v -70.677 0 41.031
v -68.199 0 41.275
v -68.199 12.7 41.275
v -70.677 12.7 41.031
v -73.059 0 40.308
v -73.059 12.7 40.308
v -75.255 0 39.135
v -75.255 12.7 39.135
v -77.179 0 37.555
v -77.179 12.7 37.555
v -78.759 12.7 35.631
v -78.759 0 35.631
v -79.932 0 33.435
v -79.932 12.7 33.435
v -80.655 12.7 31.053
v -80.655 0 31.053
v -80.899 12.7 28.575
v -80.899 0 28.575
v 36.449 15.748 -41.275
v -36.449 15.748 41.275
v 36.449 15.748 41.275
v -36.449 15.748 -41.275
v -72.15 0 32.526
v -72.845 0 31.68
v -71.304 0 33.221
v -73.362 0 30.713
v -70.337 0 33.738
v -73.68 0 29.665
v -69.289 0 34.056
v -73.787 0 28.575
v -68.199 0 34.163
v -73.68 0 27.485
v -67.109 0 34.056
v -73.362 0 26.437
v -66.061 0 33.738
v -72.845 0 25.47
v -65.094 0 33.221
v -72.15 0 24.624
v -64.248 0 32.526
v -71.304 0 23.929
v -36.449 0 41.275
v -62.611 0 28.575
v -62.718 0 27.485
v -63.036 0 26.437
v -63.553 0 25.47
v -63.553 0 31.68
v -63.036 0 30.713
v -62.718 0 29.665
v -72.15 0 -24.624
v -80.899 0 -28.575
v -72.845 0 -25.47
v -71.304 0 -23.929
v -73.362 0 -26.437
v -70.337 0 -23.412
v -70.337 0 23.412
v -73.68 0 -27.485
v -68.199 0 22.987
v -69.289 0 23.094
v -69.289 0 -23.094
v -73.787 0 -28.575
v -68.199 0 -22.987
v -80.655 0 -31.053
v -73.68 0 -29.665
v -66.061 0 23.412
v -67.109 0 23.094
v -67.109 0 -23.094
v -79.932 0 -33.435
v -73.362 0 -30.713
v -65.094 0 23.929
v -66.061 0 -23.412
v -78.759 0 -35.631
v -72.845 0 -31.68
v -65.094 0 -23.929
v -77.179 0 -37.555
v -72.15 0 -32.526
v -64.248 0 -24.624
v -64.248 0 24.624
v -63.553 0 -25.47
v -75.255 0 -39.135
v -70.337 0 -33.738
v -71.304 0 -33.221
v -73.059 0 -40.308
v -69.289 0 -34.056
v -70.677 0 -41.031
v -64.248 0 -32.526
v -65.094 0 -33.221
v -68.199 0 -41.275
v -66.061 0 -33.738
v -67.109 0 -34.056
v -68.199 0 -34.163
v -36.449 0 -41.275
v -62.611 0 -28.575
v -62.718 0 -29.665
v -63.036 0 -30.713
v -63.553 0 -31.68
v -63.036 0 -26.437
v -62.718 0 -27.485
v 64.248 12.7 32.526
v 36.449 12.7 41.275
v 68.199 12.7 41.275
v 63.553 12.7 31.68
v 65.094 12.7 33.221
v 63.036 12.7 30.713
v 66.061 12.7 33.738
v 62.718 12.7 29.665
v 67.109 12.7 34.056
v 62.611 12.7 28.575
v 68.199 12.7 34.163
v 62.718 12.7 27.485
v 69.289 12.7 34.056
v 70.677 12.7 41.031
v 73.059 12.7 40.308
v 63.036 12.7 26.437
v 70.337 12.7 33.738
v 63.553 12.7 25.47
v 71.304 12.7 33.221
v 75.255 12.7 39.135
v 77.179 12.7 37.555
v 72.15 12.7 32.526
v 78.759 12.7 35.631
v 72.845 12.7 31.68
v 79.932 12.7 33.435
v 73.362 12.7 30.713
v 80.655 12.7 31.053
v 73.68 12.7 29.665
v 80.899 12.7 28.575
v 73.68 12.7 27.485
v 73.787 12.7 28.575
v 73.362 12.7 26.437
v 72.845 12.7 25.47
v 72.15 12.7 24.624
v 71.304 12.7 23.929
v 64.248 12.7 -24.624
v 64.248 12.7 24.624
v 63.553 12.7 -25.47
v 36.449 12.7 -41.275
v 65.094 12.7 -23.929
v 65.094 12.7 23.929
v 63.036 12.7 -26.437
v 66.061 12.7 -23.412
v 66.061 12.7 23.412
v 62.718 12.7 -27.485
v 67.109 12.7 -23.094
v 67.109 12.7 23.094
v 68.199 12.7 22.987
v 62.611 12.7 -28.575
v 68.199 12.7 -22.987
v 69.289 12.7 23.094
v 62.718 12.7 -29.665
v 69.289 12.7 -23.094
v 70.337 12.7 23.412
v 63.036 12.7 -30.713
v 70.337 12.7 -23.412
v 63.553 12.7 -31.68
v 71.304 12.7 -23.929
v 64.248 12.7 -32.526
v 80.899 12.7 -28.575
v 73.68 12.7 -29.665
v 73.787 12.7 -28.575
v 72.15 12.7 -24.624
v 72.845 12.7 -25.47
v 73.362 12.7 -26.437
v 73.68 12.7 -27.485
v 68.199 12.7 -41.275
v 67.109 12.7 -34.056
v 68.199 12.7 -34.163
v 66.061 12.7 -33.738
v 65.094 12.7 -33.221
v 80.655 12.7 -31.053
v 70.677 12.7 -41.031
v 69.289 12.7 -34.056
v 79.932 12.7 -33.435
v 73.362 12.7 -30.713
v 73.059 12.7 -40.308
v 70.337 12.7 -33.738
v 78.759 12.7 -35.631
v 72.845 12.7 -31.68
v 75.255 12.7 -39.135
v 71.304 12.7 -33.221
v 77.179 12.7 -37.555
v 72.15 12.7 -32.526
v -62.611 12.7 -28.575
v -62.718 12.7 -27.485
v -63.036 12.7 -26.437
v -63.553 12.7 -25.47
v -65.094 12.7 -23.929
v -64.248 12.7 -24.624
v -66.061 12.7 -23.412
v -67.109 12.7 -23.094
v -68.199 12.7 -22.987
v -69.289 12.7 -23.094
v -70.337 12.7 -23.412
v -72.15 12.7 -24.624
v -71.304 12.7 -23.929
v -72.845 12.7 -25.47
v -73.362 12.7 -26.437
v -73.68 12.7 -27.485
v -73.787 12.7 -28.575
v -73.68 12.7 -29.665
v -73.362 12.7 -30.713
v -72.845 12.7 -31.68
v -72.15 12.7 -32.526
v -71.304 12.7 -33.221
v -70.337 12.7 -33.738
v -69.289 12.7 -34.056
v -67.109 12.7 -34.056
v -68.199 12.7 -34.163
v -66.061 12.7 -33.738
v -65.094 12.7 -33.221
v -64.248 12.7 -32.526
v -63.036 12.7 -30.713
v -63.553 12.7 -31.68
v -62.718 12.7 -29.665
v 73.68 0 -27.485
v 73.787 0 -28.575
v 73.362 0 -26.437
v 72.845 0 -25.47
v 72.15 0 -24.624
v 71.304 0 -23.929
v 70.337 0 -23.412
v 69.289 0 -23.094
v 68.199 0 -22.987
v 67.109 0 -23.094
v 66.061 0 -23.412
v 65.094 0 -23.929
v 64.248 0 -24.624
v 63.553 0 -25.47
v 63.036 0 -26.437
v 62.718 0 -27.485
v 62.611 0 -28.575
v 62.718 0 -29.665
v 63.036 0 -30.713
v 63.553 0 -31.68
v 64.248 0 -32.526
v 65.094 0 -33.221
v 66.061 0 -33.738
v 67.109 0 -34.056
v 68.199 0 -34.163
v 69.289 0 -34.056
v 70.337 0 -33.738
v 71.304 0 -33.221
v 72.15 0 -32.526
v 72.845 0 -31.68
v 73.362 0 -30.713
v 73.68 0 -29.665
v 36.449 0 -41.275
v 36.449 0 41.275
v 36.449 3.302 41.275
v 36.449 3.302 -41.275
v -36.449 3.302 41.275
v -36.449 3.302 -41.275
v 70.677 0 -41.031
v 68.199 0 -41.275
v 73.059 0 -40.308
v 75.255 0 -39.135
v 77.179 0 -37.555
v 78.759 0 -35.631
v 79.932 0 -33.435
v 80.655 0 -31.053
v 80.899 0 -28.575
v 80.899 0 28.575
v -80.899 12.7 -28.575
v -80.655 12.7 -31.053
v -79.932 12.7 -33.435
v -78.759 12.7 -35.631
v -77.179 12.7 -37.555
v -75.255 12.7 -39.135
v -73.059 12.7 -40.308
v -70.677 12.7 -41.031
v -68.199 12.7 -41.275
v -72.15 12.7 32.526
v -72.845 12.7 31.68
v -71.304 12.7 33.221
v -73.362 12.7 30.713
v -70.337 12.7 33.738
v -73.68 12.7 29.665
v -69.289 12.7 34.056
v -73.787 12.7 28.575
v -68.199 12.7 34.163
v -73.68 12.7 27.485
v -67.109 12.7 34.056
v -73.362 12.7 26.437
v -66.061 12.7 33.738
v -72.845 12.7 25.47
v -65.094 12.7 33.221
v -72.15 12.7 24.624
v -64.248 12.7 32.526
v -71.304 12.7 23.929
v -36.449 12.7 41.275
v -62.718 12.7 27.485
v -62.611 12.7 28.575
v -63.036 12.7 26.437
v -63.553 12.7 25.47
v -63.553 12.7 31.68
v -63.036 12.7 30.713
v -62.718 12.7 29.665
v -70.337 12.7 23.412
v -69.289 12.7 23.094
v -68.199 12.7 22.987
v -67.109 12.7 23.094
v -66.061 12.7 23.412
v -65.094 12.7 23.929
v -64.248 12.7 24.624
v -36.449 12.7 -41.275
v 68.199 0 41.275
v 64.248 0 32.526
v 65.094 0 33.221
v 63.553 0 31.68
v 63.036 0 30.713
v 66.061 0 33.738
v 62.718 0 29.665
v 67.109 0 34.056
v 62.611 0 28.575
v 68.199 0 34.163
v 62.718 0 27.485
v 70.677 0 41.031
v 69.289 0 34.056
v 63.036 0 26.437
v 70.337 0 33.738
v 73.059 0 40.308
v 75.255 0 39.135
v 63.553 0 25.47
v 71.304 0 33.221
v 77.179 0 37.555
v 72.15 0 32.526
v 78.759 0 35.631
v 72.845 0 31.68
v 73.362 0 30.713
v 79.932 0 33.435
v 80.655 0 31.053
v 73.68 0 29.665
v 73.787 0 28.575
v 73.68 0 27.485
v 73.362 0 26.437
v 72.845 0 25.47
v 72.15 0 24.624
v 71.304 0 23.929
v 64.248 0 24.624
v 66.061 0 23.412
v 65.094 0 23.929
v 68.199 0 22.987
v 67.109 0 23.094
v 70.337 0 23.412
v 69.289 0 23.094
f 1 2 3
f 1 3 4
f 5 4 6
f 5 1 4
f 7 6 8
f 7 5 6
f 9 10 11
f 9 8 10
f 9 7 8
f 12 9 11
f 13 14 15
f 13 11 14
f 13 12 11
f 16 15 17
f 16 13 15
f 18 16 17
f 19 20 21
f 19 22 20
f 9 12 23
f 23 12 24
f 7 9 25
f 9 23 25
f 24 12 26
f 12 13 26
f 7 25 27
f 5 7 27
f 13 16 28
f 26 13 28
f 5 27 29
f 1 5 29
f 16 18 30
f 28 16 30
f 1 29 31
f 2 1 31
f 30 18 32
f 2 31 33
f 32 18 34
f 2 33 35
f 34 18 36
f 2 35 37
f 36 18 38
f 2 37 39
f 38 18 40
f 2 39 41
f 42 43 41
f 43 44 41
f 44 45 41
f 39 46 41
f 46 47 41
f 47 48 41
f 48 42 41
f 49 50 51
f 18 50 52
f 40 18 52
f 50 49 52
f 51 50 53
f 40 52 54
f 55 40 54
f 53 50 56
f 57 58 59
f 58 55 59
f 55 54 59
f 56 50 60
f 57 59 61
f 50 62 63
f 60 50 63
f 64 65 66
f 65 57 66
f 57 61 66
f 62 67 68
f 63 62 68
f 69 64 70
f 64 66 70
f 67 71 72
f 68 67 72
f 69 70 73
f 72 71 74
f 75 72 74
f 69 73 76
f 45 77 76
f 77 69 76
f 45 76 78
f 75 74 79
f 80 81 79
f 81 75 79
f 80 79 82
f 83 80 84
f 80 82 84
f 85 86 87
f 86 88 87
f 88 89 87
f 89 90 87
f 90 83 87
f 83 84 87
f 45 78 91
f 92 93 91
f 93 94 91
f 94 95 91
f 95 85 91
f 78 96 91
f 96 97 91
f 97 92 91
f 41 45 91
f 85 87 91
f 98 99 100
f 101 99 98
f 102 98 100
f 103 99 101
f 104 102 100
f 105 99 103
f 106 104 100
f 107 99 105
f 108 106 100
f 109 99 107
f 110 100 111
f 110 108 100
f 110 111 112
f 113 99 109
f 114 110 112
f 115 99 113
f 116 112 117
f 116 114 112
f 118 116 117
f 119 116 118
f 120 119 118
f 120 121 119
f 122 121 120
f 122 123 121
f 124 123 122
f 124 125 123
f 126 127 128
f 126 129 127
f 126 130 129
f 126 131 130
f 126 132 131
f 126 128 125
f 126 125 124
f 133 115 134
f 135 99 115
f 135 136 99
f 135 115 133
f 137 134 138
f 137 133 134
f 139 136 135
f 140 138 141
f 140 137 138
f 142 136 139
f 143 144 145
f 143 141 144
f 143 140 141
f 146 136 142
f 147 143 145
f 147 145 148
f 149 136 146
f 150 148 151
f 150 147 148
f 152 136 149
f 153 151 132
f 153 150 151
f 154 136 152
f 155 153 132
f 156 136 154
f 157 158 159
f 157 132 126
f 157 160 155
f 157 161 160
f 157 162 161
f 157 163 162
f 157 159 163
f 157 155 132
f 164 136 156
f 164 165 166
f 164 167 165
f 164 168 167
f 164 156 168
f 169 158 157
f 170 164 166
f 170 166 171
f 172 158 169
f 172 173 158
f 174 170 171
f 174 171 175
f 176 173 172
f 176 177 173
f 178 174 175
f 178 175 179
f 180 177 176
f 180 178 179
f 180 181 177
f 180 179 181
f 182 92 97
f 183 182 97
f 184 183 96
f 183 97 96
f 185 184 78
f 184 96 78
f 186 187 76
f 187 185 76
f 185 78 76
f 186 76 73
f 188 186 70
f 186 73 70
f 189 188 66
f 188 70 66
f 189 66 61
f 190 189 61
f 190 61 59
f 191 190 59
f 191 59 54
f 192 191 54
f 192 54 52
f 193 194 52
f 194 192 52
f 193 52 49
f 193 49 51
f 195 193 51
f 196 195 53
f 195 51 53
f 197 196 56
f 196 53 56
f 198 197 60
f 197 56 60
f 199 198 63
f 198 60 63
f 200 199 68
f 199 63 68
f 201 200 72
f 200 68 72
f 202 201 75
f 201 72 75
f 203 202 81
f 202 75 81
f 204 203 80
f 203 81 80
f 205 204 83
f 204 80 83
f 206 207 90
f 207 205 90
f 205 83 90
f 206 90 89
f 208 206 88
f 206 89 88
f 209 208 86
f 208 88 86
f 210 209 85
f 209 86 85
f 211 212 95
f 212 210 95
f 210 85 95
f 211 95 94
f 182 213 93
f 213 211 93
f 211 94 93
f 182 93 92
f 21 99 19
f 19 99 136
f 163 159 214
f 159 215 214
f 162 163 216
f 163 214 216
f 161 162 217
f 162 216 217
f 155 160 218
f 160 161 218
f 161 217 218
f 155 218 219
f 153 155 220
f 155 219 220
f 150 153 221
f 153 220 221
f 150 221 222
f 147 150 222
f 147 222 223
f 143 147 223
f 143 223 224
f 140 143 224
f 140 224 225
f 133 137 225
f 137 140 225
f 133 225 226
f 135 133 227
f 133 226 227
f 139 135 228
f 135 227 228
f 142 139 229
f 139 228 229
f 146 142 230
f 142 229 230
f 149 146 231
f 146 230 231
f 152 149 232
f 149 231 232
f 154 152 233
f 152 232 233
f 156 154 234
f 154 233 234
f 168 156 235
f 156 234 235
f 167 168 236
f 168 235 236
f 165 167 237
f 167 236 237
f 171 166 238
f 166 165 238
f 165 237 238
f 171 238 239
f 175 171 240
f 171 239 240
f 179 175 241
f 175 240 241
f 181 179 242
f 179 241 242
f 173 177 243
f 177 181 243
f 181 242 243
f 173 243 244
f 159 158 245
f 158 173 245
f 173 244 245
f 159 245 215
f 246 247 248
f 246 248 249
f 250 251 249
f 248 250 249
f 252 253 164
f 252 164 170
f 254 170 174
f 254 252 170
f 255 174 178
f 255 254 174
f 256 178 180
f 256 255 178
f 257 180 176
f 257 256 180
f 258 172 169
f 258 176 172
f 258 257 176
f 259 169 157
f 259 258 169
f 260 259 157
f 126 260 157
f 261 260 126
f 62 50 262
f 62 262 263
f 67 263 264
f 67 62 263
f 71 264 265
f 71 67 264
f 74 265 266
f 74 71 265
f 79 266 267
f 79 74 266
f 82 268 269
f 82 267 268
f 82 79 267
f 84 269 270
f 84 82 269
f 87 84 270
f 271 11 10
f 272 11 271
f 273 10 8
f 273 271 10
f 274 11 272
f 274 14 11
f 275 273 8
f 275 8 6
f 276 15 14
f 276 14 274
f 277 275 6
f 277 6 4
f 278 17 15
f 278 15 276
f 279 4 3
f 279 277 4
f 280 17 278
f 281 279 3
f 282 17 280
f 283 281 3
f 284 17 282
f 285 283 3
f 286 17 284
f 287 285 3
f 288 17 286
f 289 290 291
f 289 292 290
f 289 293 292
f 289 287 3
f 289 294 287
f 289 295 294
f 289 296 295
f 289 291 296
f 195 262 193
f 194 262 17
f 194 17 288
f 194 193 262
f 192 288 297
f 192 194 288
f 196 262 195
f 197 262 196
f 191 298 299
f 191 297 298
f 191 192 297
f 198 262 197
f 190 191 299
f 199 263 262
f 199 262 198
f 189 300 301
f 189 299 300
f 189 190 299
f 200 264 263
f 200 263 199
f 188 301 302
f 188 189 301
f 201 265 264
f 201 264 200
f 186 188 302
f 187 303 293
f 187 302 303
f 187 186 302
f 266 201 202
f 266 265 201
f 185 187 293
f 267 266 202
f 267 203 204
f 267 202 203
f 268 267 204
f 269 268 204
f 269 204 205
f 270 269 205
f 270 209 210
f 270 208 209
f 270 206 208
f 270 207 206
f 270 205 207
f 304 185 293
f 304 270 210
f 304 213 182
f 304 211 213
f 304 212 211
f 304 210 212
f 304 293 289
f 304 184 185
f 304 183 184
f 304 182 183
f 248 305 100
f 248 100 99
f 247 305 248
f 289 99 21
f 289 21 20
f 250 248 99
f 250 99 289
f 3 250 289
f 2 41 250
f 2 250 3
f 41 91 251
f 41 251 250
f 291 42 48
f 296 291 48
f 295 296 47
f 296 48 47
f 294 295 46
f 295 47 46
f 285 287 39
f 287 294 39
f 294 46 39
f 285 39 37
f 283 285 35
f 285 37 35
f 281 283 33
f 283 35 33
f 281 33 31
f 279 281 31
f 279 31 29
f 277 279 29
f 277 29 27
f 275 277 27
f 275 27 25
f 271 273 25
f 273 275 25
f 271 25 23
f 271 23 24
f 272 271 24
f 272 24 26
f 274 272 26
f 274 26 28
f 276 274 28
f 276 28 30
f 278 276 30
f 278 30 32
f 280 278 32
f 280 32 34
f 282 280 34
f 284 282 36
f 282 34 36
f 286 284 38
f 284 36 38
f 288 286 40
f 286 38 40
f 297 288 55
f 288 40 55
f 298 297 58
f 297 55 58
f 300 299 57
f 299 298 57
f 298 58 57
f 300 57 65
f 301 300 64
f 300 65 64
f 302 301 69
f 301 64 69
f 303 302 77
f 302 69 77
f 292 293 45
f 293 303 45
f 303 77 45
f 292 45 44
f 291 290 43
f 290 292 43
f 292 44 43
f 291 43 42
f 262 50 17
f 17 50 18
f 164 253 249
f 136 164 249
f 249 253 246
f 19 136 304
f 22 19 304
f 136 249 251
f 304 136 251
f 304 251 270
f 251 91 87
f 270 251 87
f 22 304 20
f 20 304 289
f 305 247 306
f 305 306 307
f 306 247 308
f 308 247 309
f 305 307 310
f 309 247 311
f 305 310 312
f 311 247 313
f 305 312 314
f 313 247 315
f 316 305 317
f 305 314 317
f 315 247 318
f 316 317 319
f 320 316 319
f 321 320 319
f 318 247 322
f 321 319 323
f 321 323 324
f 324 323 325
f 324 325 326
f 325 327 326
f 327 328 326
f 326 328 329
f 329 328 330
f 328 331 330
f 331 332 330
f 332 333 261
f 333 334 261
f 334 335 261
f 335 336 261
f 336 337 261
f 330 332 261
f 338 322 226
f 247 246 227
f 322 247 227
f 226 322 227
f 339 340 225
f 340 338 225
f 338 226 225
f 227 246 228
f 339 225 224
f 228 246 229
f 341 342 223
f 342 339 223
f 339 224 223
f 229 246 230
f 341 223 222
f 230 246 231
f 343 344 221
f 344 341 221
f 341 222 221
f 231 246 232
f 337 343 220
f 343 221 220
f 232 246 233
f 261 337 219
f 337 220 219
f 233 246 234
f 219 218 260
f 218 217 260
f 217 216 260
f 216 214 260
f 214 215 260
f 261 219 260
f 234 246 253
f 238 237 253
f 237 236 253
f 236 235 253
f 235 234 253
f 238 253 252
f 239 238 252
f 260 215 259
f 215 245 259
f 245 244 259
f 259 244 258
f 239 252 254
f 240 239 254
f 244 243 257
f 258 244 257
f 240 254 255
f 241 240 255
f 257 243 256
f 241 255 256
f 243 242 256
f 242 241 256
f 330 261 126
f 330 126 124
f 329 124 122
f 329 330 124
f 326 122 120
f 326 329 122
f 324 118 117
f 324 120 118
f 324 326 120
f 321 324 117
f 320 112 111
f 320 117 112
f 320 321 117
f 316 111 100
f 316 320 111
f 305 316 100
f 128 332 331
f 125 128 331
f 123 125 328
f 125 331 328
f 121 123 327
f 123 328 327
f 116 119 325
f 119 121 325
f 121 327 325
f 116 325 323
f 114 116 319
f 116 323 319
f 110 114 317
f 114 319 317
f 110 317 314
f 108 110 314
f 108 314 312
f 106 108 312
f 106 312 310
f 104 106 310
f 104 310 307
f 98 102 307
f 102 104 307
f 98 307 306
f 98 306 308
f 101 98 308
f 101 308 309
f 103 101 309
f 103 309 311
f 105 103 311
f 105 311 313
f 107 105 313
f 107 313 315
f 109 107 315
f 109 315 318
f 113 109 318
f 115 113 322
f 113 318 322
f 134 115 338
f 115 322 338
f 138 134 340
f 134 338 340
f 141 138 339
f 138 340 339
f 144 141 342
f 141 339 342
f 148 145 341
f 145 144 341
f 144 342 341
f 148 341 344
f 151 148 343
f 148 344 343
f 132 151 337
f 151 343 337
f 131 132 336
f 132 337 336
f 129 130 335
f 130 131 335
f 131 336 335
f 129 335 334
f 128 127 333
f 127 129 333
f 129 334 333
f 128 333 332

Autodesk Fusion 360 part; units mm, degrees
sketch "Sketch2" plane through (0, 0, 0) normal (0, 1, 0) x (1, 0, 0)
  circle A0 centre (-68.199, 28.575) radius 5.588
  circle A1 centre (-68.199, -28.575) radius 5.588
  circle A2 centre (68.199, -28.575) radius 5.588
  circle A3 centre (68.199, 28.575) radius 5.588
  circle A4 centre (68.199, 28.575) radius 12.7
  circle A5 centre (68.199, -28.575) radius 12.7
  circle A6 centre (-68.199, 28.575) radius 12.7
  circle A7 centre (-68.199, -28.575) radius 12.7
  line L0 (-80.899, 28.575) -> (-80.899, -28.575)
  line L1 (68.199, -41.275) -> (-68.199, -41.275)
  line L2 (80.899, 28.575) -> (80.899, -28.575)
  line L3 (68.199, 41.275) -> (-68.199, 41.275)
  line L4 (68.199, -28.575) -> (56.4856, -23.6672) construction
  line L5 (-36.449, 41.275) -> (-36.449, -41.275)
  line L6 (36.449, -41.275) -> (36.449, 41.275)
  line L7 (56.4856, 23.6672) -> (68.199, 28.575) construction
  dimension "d19" = 136.398
  dimension "d20" = 57.15
  dimension "d21" = 11.176
  dimension "d22" = 11.176
  dimension "d23" = 11.176
  dimension "d24" = 11.176
  dimension "d25" = 25.4
  dimension "d26" = 25.4
  dimension "d27" = 25.4
  dimension "d28" = 25.4
extrude "Extrude5" add sketch "Sketch2" along normal blind 15.748 contours L1 L3 L5 L6 makes body 1
extrude "Extrude4" add sketch "Sketch2" along normal blind 12.7 separate body contours A4 | A4 A5 L1 L2 L3 L6 | A5 | A6 A7 L0 L1 L3 L5 | A6 | A7 makes body 2 at (-45.4933, 0, 8.4757) makes body 3 at (45.4933, 0, 8.4757)
extrude "Extrude6" cut sketch "Sketch2" along normal blind 3.302 contours L1 L3 L5 L6 bodies 1
combine "Combine2" operation add target body 3 tool bodies 1 2
